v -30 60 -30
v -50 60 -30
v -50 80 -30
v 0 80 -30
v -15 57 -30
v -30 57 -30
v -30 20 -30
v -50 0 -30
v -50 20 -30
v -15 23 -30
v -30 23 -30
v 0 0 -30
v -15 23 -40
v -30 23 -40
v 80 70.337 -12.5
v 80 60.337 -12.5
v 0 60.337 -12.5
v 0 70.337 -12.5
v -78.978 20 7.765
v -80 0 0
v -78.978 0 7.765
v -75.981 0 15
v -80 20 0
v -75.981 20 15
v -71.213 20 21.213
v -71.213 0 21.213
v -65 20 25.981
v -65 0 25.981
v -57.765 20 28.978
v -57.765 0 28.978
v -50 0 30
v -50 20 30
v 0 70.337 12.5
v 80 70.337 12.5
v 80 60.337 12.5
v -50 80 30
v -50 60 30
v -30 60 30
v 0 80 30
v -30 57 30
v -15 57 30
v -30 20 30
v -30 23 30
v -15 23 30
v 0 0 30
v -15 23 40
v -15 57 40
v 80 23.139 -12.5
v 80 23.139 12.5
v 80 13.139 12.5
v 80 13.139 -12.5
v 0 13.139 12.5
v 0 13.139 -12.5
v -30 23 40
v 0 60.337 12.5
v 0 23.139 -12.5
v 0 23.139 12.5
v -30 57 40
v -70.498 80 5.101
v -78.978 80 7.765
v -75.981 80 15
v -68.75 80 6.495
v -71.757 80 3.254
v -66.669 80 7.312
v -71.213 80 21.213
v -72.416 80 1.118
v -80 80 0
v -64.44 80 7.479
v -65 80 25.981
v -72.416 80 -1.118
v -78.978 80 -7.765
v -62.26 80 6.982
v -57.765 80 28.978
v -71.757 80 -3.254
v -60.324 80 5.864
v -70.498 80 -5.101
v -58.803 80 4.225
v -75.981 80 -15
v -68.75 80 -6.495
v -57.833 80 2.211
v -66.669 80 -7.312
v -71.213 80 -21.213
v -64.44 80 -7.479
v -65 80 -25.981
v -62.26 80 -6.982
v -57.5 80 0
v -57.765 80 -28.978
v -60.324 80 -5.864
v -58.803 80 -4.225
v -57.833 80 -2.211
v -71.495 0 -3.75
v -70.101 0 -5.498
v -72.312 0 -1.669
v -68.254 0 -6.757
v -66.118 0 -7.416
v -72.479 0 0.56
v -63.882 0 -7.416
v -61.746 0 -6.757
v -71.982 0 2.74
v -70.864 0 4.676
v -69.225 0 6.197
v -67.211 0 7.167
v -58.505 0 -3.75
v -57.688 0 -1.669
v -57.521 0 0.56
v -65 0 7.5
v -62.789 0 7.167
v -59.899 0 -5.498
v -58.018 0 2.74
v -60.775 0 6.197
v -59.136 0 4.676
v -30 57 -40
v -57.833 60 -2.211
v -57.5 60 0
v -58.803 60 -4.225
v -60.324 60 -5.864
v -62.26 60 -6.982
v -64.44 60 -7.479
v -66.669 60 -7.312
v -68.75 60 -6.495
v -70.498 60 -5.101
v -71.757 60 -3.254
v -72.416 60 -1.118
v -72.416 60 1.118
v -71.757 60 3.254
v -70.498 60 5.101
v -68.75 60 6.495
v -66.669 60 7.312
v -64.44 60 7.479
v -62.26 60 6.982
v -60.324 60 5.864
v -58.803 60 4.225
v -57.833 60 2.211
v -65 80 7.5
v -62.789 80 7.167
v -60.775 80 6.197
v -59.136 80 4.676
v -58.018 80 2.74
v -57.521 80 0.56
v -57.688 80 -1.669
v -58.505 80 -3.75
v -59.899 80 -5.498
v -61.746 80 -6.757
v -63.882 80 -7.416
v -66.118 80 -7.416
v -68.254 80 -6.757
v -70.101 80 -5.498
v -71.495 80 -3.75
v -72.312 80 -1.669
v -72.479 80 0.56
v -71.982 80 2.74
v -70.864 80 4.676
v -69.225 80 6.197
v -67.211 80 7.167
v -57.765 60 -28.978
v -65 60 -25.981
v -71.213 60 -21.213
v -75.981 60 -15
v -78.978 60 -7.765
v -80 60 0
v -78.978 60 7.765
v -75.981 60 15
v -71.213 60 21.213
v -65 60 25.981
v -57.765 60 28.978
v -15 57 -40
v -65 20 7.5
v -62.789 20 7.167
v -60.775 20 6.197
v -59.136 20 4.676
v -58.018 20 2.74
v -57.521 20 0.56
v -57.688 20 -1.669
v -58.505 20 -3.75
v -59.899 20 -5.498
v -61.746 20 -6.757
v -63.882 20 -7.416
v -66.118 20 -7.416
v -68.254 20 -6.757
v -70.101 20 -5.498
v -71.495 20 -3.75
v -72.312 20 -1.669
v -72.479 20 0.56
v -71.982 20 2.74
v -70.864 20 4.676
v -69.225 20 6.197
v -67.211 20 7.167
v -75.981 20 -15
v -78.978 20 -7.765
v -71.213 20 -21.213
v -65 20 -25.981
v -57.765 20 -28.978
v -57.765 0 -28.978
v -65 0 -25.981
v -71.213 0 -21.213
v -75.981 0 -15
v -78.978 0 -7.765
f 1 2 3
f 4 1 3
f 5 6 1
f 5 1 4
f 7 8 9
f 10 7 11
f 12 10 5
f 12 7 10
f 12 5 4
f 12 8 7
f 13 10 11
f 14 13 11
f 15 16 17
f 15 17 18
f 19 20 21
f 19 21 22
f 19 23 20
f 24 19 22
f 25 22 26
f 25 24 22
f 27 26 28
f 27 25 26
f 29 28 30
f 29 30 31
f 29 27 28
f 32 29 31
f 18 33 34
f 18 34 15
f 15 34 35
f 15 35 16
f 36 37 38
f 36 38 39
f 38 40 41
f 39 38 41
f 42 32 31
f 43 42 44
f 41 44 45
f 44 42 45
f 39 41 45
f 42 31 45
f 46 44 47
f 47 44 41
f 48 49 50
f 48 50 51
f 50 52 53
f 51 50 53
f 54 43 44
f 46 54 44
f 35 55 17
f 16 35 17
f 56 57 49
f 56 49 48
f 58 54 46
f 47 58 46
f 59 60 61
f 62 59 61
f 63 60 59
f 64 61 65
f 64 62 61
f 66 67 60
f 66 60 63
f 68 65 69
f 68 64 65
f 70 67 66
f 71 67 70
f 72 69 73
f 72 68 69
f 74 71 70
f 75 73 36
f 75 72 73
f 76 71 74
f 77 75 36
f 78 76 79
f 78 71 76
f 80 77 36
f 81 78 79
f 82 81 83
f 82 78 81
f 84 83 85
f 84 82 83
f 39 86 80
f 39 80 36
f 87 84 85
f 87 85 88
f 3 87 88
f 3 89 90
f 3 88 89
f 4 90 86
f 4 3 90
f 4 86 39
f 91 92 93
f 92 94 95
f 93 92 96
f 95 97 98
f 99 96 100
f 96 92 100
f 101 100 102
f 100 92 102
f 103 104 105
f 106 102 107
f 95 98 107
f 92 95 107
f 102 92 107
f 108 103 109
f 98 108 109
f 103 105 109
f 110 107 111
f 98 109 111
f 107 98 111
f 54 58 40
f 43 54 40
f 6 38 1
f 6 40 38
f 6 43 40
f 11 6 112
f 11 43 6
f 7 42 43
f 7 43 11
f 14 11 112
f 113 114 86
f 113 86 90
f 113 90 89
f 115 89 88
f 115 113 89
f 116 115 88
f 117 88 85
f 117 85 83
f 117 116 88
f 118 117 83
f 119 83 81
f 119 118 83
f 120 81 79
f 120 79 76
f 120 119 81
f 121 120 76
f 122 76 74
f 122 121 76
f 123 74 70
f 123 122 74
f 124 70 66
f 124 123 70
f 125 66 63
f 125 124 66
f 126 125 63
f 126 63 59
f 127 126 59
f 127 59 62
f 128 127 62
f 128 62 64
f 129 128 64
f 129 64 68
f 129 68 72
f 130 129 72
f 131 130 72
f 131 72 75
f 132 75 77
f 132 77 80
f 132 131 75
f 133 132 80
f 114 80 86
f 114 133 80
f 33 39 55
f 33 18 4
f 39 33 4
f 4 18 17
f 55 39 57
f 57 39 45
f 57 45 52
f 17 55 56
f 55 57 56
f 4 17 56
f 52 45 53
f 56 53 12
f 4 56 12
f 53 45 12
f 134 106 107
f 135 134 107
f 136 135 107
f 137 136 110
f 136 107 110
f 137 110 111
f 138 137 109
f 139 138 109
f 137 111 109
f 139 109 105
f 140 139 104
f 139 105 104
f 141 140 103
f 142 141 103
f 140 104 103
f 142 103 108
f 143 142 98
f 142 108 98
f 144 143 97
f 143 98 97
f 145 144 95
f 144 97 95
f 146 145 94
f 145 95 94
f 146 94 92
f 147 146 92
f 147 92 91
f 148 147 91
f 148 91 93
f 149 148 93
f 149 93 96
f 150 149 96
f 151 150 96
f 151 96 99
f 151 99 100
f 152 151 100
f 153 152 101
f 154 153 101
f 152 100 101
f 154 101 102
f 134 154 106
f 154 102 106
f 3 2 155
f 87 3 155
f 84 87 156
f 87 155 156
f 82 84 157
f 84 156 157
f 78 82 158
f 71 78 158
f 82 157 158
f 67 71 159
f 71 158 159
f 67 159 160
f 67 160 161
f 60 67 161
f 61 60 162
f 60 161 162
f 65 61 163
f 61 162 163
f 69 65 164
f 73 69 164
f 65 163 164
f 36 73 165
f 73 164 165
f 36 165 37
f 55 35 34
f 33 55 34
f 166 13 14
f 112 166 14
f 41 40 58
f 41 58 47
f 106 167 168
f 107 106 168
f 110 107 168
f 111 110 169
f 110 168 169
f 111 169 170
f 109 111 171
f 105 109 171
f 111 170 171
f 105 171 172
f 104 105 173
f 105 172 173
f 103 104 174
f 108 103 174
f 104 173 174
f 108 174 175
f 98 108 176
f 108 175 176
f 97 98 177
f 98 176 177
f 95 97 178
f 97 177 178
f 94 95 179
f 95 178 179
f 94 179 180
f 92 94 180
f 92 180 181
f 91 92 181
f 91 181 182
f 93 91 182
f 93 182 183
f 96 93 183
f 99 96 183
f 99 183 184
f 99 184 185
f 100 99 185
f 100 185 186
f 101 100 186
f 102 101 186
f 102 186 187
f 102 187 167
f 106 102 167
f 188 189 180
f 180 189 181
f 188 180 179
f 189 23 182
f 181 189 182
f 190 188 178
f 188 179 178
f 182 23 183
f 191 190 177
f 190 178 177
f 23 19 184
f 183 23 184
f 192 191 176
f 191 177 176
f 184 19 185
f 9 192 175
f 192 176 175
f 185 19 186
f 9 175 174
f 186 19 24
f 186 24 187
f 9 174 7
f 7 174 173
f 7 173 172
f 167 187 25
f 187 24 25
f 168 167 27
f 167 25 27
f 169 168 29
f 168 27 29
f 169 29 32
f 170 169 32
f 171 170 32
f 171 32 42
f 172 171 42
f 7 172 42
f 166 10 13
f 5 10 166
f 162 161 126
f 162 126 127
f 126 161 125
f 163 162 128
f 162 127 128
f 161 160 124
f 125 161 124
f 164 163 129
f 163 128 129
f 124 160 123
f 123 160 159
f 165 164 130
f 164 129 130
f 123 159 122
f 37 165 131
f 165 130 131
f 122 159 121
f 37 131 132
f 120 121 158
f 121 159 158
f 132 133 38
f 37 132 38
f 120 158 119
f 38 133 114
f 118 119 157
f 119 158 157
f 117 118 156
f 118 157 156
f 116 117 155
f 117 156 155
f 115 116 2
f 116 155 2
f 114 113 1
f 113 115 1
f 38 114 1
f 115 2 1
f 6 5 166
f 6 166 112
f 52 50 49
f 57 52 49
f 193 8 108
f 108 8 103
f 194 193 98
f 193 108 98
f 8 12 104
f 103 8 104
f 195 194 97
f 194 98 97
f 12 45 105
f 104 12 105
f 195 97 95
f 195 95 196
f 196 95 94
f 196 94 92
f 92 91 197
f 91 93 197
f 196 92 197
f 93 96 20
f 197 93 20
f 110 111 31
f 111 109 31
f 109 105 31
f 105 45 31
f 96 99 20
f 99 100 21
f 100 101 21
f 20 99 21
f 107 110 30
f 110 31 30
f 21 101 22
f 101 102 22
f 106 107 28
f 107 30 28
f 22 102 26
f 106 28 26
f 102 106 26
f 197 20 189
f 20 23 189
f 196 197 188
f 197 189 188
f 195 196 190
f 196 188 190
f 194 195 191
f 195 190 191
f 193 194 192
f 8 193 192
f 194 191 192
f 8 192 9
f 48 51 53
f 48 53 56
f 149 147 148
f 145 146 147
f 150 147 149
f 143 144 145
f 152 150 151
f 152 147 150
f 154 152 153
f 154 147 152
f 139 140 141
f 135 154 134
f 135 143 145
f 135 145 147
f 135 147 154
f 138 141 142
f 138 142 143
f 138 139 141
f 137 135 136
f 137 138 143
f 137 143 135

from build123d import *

# Parameters (mm, degrees)
BOSS_EXTRUDE1_DEPTH      = 30
SKETCH3_R                = 7.5
CUT_EXTRUDE1_DEPTH       = 30
FILLET1_R                = 30
FILLET2_R                = 30
MIRROR3_START            = 60
MIRROR3_OUTLINE_R        = 7.5
MIRROR3_DEPTH            = 20
MIRROR3_START_2          = 40
MIRROR3_2_OUTLINE_W      = 30
MIRROR3_2_OUTLINE_H      = 60
MIRROR3_2_DEPTH          = 20
SKETCH5_W                = 25
SKETCH5_H                = 10
BOSS_EXTRUDE3_DEPTH      = 80
SKETCH6_W                = 15
SKETCH6_H                = 34
BOSS_EXTRUDE4_DEPTH      = 10
SKETCH8_W                = 15
SKETCH8_H                = 34
BOSS_EXTRUDE5_DEPTH      = 10
BOSS_EXTRUDE6_DEPTH      = 60
BOSS_EXTRUDE6_DEPTH_BACK = 20
SKETCH9_R                = 7.5


# Read off the part's stored shape, not the designer's step: Mirror3
with BuildPart() as part:
    # Sketch1 → Boss-Extrude1 (new, symmetric)
    with BuildSketch(Plane.XY):
        Polygon((-80, 0), (-80, 20), (-30, 20), (-30, 40), (0, 40), (0, 0), align=None)
    extrude(amount=BOSS_EXTRUDE1_DEPTH, both=True)

    # Sketch3 → Cut-Extrude1 (cut)
    with BuildSketch(Plane(origin=(0, 20, 0), x_dir=(1, 0, 0), z_dir=(0, 1, 0))):
        with Locations(Location((-65, 0, 0), (0, 0, 270))):
            Circle(SKETCH3_R)
    extrude(amount=-CUT_EXTRUDE1_DEPTH, mode=Mode.SUBTRACT)

    # Fillet1
    fillet1_edges = [part.edges().sort_by_distance(p)[0] for p in [
        (-80, 10, 30),
    ]]
    fillet(fillet1_edges, radius=FILLET1_R)

    # Fillet2
    fillet2_edges = [part.edges().sort_by_distance(p)[0] for p in [
        (-80, 10, -30),
    ]]
    fillet(fillet2_edges, radius=FILLET2_R - 0.0001)  # a hair under: the kernel refuses the full size



with BuildPart() as body_2:
    # Mirror3 outline → Mirror3 (new body)
    with BuildSketch(Plane(origin=(0, 0, 0), x_dir=(1, 0, 0), z_dir=(0, 1, 0)).offset(MIRROR3_START)):
        with BuildLine():
            Line((0, -30), (0, 30))
            Line((0, 30), (-50, 30))
            ThreePointArc((-50, 30), (-71.213203436, 21.213203436), (-80, 0))
            ThreePointArc((-80, 0), (-71.213203436, -21.213203436), (-50, -30))
            Line((-50, -30), (0, -30))
        make_face()
        with Locations((-65, 0)):
            Circle(MIRROR3_OUTLINE_R, mode=Mode.SUBTRACT)
    extrude(amount=MIRROR3_DEPTH)


with BuildPart() as part_1:
    add(part.part)

    add(body_2.part)  # Mirror3 2 merges body 2
    # Mirror3 2 outline → Mirror3 2 (add)
    with BuildSketch(Plane(origin=(0, 0, 0), x_dir=(1, 0, 0), z_dir=(0, 1, 0)).offset(MIRROR3_START_2)):
        with Locations((-15, 0)):
            Rectangle(MIRROR3_2_OUTLINE_W, MIRROR3_2_OUTLINE_H)
    extrude(amount=MIRROR3_2_DEPTH)

    # Sketch5 → Boss-Extrude3 (add)
    with BuildSketch(Plane(origin=(0, 0, 0), x_dir=(0, 0, -1), z_dir=(1, 0, 0))):
        with Locations((0, 65.336865941)):
            Rectangle(SKETCH5_W, SKETCH5_H)
        with Locations((0, 18.138949218)):
            Rectangle(SKETCH5_W, SKETCH5_H)
    extrude(amount=BOSS_EXTRUDE3_DEPTH)

    # Sketch6 → Boss-Extrude4 (add)
    with BuildSketch(Plane.XY.offset(30)):
        with Locations((-22.5, 40)):
            Rectangle(SKETCH6_W, SKETCH6_H)
    extrude(amount=BOSS_EXTRUDE4_DEPTH)

    # Sketch8 → Boss-Extrude5 (add)
    with BuildSketch(Plane(origin=(0, 0, -30), x_dir=(-1, 0, 0), z_dir=(0, 0, -1))):
        with Locations((22.5, 40)):
            Rectangle(SKETCH8_W, SKETCH8_H)
    extrude(amount=BOSS_EXTRUDE5_DEPTH)


with BuildPart() as body_2_2:
    # Sketch9 → Boss-Extrude6 (new, two sides: drawn at the far end of the back side and taken through both)
    with BuildSketch(Plane(origin=(0, 20, 0), x_dir=(1, 0, 0), z_dir=(0, 1, 0)).offset(-BOSS_EXTRUDE6_DEPTH_BACK)):
        with Locations(Location((-65, 0, 0), (0, 0, 270))):
            Circle(SKETCH9_R)
    extrude(amount=BOSS_EXTRUDE6_DEPTH + BOSS_EXTRUDE6_DEPTH_BACK)


solid = Compound([part_1.part, body_2_2.part])
